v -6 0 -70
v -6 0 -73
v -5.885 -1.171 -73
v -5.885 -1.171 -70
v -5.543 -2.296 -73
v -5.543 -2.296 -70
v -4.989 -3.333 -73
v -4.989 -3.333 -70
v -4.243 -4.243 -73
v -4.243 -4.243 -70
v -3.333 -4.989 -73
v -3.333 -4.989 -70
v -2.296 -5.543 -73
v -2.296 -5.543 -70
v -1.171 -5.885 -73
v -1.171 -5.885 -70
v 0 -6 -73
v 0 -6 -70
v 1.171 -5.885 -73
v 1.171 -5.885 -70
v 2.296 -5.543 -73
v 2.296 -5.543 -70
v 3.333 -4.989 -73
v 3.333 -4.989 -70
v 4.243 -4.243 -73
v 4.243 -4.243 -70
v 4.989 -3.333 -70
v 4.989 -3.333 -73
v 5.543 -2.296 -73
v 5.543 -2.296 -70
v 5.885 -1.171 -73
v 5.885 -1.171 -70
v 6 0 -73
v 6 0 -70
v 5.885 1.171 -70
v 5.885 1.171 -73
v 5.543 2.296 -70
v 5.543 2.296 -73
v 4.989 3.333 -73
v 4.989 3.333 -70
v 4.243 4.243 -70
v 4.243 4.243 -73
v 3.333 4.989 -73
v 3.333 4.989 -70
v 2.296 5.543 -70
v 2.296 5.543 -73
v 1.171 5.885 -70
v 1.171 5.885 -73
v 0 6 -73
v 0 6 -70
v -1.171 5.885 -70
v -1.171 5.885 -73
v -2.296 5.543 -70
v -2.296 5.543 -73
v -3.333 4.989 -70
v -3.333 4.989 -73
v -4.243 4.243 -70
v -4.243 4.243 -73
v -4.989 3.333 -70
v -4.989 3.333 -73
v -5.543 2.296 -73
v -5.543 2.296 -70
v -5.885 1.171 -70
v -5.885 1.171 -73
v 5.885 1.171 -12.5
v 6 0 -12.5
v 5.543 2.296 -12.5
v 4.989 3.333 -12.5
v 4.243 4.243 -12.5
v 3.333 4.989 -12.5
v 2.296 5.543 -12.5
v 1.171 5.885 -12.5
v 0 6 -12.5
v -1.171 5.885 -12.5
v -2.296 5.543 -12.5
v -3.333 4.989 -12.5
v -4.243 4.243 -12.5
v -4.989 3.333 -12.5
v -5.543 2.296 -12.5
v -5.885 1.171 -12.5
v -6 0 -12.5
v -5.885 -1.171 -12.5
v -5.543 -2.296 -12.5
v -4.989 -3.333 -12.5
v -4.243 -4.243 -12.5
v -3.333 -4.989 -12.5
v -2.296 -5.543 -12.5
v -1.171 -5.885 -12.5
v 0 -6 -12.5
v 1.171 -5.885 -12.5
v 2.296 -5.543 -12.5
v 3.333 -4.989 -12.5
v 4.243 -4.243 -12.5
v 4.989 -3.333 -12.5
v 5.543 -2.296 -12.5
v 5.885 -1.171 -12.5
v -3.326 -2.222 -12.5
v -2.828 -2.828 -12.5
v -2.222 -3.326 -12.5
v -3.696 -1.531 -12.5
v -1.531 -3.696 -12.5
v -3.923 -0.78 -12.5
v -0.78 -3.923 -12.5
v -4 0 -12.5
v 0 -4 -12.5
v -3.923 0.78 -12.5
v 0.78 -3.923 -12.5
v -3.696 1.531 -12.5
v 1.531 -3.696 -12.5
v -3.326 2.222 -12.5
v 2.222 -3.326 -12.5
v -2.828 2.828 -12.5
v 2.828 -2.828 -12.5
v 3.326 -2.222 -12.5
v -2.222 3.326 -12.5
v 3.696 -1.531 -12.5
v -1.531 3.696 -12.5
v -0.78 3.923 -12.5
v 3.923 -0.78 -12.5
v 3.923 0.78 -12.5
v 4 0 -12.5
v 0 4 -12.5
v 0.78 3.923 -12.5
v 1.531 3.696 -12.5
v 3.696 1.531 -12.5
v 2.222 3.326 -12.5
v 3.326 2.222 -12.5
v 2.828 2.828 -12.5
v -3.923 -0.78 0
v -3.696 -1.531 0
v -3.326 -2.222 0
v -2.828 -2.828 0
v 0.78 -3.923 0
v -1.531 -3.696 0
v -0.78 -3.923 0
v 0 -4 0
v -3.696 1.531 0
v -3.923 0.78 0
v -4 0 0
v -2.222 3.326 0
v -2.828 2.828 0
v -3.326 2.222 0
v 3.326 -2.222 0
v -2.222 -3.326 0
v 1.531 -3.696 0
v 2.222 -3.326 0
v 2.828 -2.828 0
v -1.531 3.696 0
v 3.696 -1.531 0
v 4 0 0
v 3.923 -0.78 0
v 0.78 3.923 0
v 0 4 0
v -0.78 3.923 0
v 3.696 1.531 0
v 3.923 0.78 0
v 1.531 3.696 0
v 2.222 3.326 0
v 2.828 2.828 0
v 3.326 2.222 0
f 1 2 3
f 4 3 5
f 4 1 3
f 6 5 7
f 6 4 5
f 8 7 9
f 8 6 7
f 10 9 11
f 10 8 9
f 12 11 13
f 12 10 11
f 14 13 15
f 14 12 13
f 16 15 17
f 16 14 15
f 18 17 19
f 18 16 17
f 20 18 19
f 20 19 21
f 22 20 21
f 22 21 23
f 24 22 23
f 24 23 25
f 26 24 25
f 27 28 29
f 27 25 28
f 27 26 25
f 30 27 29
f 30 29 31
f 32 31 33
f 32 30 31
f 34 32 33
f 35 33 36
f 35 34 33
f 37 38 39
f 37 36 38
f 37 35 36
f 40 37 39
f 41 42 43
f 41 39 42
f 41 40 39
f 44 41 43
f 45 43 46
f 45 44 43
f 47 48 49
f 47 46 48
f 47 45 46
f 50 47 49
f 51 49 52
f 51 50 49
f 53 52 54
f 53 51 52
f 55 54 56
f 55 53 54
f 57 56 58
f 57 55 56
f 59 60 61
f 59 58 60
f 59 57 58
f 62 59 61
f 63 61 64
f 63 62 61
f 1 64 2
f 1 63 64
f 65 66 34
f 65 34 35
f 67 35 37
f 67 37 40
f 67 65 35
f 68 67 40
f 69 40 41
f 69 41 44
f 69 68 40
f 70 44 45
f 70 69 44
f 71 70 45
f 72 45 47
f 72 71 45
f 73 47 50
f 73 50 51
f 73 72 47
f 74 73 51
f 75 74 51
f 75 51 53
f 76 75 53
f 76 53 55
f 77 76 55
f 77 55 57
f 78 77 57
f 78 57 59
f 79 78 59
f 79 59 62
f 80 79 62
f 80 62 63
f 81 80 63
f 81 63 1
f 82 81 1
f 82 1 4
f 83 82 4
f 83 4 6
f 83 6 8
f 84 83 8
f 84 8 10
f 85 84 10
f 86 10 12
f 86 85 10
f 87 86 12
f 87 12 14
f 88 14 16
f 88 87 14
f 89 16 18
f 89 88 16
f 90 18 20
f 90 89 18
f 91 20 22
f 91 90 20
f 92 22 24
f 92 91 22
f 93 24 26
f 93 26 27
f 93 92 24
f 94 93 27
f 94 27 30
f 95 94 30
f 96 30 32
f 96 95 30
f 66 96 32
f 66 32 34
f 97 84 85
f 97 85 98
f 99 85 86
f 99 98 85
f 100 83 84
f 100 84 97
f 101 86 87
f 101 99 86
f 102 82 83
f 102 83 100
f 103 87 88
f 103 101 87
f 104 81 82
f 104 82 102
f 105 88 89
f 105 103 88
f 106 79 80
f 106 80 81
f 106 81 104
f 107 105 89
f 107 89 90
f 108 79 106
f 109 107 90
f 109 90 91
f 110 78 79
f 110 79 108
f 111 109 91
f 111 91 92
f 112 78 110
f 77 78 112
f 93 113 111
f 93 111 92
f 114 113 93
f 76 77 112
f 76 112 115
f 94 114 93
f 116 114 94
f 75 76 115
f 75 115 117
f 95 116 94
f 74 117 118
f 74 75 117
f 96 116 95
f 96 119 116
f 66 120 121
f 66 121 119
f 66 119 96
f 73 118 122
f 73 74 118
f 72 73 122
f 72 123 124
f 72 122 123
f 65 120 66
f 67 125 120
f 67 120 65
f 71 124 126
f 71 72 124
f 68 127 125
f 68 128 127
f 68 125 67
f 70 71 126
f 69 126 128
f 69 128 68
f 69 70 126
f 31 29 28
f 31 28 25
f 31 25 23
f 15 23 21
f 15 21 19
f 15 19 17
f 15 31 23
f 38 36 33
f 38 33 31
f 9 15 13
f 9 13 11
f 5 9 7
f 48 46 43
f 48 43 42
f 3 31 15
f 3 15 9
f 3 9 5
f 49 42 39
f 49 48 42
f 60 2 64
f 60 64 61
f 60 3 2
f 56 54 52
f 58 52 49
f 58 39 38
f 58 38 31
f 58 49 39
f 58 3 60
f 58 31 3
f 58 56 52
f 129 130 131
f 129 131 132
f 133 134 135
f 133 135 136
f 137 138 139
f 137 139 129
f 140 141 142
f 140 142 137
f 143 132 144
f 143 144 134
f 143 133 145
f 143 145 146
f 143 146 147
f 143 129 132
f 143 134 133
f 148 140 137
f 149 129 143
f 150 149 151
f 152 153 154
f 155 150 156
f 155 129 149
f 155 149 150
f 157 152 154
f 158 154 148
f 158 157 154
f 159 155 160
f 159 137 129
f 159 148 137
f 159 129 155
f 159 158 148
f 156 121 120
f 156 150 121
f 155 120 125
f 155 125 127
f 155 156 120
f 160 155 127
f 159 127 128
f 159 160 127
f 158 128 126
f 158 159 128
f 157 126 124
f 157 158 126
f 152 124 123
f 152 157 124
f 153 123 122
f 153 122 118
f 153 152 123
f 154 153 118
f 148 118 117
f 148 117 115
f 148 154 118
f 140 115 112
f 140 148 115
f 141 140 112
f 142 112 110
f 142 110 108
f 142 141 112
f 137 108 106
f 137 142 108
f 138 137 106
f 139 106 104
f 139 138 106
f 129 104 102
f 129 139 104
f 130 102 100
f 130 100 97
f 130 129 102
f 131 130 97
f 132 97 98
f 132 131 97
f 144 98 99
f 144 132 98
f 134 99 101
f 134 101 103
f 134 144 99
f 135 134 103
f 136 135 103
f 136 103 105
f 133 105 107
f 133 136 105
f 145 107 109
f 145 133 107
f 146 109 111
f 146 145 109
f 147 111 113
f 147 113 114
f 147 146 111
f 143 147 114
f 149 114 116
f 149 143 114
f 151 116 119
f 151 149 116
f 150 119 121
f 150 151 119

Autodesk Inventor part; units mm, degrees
ref_plane "YZ Plane" through (0, 0, 0) normal (1, 0, 0) x (0, 1, 0)
ref_plane "XZ Plane" through (0, 0, 0) normal (0, 1, 0) x (-1, 0, 0)
ref_plane "XY Plane" through (0, 0, 0) normal (0, 0, 1) x (1, 0, 0)
sketch "スケッチ1" plane through (0, 0, 0) normal (0, 0, 1) x (1, 0, 0)
  circle A0 centre (0, 0) radius 6
  dimension "d0" = 12
extrude "押し出し1" add sketch "スケッチ1" against normal blind 70
sketch "スケッチ2" plane through (0, 0, 0) normal (0, 0, 1) x (1, 0, 0)
  circle A0 centre (0, 0) radius 6
  circle A1 centre (0, 0) radius 4
  dimension "d3" = 8
extrude "押し出し2" cut sketch "スケッチ2" against normal blind 12.5
sketch "スケッチ3" plane through (0, 0, -70) normal (0, 0, -1) x (-1, 0, 0)
  circle A0 centre (0, 0) radius 6
extrude "押し出し3" add sketch "スケッチ3" along normal blind 3
properties part number "円柱12mm"
